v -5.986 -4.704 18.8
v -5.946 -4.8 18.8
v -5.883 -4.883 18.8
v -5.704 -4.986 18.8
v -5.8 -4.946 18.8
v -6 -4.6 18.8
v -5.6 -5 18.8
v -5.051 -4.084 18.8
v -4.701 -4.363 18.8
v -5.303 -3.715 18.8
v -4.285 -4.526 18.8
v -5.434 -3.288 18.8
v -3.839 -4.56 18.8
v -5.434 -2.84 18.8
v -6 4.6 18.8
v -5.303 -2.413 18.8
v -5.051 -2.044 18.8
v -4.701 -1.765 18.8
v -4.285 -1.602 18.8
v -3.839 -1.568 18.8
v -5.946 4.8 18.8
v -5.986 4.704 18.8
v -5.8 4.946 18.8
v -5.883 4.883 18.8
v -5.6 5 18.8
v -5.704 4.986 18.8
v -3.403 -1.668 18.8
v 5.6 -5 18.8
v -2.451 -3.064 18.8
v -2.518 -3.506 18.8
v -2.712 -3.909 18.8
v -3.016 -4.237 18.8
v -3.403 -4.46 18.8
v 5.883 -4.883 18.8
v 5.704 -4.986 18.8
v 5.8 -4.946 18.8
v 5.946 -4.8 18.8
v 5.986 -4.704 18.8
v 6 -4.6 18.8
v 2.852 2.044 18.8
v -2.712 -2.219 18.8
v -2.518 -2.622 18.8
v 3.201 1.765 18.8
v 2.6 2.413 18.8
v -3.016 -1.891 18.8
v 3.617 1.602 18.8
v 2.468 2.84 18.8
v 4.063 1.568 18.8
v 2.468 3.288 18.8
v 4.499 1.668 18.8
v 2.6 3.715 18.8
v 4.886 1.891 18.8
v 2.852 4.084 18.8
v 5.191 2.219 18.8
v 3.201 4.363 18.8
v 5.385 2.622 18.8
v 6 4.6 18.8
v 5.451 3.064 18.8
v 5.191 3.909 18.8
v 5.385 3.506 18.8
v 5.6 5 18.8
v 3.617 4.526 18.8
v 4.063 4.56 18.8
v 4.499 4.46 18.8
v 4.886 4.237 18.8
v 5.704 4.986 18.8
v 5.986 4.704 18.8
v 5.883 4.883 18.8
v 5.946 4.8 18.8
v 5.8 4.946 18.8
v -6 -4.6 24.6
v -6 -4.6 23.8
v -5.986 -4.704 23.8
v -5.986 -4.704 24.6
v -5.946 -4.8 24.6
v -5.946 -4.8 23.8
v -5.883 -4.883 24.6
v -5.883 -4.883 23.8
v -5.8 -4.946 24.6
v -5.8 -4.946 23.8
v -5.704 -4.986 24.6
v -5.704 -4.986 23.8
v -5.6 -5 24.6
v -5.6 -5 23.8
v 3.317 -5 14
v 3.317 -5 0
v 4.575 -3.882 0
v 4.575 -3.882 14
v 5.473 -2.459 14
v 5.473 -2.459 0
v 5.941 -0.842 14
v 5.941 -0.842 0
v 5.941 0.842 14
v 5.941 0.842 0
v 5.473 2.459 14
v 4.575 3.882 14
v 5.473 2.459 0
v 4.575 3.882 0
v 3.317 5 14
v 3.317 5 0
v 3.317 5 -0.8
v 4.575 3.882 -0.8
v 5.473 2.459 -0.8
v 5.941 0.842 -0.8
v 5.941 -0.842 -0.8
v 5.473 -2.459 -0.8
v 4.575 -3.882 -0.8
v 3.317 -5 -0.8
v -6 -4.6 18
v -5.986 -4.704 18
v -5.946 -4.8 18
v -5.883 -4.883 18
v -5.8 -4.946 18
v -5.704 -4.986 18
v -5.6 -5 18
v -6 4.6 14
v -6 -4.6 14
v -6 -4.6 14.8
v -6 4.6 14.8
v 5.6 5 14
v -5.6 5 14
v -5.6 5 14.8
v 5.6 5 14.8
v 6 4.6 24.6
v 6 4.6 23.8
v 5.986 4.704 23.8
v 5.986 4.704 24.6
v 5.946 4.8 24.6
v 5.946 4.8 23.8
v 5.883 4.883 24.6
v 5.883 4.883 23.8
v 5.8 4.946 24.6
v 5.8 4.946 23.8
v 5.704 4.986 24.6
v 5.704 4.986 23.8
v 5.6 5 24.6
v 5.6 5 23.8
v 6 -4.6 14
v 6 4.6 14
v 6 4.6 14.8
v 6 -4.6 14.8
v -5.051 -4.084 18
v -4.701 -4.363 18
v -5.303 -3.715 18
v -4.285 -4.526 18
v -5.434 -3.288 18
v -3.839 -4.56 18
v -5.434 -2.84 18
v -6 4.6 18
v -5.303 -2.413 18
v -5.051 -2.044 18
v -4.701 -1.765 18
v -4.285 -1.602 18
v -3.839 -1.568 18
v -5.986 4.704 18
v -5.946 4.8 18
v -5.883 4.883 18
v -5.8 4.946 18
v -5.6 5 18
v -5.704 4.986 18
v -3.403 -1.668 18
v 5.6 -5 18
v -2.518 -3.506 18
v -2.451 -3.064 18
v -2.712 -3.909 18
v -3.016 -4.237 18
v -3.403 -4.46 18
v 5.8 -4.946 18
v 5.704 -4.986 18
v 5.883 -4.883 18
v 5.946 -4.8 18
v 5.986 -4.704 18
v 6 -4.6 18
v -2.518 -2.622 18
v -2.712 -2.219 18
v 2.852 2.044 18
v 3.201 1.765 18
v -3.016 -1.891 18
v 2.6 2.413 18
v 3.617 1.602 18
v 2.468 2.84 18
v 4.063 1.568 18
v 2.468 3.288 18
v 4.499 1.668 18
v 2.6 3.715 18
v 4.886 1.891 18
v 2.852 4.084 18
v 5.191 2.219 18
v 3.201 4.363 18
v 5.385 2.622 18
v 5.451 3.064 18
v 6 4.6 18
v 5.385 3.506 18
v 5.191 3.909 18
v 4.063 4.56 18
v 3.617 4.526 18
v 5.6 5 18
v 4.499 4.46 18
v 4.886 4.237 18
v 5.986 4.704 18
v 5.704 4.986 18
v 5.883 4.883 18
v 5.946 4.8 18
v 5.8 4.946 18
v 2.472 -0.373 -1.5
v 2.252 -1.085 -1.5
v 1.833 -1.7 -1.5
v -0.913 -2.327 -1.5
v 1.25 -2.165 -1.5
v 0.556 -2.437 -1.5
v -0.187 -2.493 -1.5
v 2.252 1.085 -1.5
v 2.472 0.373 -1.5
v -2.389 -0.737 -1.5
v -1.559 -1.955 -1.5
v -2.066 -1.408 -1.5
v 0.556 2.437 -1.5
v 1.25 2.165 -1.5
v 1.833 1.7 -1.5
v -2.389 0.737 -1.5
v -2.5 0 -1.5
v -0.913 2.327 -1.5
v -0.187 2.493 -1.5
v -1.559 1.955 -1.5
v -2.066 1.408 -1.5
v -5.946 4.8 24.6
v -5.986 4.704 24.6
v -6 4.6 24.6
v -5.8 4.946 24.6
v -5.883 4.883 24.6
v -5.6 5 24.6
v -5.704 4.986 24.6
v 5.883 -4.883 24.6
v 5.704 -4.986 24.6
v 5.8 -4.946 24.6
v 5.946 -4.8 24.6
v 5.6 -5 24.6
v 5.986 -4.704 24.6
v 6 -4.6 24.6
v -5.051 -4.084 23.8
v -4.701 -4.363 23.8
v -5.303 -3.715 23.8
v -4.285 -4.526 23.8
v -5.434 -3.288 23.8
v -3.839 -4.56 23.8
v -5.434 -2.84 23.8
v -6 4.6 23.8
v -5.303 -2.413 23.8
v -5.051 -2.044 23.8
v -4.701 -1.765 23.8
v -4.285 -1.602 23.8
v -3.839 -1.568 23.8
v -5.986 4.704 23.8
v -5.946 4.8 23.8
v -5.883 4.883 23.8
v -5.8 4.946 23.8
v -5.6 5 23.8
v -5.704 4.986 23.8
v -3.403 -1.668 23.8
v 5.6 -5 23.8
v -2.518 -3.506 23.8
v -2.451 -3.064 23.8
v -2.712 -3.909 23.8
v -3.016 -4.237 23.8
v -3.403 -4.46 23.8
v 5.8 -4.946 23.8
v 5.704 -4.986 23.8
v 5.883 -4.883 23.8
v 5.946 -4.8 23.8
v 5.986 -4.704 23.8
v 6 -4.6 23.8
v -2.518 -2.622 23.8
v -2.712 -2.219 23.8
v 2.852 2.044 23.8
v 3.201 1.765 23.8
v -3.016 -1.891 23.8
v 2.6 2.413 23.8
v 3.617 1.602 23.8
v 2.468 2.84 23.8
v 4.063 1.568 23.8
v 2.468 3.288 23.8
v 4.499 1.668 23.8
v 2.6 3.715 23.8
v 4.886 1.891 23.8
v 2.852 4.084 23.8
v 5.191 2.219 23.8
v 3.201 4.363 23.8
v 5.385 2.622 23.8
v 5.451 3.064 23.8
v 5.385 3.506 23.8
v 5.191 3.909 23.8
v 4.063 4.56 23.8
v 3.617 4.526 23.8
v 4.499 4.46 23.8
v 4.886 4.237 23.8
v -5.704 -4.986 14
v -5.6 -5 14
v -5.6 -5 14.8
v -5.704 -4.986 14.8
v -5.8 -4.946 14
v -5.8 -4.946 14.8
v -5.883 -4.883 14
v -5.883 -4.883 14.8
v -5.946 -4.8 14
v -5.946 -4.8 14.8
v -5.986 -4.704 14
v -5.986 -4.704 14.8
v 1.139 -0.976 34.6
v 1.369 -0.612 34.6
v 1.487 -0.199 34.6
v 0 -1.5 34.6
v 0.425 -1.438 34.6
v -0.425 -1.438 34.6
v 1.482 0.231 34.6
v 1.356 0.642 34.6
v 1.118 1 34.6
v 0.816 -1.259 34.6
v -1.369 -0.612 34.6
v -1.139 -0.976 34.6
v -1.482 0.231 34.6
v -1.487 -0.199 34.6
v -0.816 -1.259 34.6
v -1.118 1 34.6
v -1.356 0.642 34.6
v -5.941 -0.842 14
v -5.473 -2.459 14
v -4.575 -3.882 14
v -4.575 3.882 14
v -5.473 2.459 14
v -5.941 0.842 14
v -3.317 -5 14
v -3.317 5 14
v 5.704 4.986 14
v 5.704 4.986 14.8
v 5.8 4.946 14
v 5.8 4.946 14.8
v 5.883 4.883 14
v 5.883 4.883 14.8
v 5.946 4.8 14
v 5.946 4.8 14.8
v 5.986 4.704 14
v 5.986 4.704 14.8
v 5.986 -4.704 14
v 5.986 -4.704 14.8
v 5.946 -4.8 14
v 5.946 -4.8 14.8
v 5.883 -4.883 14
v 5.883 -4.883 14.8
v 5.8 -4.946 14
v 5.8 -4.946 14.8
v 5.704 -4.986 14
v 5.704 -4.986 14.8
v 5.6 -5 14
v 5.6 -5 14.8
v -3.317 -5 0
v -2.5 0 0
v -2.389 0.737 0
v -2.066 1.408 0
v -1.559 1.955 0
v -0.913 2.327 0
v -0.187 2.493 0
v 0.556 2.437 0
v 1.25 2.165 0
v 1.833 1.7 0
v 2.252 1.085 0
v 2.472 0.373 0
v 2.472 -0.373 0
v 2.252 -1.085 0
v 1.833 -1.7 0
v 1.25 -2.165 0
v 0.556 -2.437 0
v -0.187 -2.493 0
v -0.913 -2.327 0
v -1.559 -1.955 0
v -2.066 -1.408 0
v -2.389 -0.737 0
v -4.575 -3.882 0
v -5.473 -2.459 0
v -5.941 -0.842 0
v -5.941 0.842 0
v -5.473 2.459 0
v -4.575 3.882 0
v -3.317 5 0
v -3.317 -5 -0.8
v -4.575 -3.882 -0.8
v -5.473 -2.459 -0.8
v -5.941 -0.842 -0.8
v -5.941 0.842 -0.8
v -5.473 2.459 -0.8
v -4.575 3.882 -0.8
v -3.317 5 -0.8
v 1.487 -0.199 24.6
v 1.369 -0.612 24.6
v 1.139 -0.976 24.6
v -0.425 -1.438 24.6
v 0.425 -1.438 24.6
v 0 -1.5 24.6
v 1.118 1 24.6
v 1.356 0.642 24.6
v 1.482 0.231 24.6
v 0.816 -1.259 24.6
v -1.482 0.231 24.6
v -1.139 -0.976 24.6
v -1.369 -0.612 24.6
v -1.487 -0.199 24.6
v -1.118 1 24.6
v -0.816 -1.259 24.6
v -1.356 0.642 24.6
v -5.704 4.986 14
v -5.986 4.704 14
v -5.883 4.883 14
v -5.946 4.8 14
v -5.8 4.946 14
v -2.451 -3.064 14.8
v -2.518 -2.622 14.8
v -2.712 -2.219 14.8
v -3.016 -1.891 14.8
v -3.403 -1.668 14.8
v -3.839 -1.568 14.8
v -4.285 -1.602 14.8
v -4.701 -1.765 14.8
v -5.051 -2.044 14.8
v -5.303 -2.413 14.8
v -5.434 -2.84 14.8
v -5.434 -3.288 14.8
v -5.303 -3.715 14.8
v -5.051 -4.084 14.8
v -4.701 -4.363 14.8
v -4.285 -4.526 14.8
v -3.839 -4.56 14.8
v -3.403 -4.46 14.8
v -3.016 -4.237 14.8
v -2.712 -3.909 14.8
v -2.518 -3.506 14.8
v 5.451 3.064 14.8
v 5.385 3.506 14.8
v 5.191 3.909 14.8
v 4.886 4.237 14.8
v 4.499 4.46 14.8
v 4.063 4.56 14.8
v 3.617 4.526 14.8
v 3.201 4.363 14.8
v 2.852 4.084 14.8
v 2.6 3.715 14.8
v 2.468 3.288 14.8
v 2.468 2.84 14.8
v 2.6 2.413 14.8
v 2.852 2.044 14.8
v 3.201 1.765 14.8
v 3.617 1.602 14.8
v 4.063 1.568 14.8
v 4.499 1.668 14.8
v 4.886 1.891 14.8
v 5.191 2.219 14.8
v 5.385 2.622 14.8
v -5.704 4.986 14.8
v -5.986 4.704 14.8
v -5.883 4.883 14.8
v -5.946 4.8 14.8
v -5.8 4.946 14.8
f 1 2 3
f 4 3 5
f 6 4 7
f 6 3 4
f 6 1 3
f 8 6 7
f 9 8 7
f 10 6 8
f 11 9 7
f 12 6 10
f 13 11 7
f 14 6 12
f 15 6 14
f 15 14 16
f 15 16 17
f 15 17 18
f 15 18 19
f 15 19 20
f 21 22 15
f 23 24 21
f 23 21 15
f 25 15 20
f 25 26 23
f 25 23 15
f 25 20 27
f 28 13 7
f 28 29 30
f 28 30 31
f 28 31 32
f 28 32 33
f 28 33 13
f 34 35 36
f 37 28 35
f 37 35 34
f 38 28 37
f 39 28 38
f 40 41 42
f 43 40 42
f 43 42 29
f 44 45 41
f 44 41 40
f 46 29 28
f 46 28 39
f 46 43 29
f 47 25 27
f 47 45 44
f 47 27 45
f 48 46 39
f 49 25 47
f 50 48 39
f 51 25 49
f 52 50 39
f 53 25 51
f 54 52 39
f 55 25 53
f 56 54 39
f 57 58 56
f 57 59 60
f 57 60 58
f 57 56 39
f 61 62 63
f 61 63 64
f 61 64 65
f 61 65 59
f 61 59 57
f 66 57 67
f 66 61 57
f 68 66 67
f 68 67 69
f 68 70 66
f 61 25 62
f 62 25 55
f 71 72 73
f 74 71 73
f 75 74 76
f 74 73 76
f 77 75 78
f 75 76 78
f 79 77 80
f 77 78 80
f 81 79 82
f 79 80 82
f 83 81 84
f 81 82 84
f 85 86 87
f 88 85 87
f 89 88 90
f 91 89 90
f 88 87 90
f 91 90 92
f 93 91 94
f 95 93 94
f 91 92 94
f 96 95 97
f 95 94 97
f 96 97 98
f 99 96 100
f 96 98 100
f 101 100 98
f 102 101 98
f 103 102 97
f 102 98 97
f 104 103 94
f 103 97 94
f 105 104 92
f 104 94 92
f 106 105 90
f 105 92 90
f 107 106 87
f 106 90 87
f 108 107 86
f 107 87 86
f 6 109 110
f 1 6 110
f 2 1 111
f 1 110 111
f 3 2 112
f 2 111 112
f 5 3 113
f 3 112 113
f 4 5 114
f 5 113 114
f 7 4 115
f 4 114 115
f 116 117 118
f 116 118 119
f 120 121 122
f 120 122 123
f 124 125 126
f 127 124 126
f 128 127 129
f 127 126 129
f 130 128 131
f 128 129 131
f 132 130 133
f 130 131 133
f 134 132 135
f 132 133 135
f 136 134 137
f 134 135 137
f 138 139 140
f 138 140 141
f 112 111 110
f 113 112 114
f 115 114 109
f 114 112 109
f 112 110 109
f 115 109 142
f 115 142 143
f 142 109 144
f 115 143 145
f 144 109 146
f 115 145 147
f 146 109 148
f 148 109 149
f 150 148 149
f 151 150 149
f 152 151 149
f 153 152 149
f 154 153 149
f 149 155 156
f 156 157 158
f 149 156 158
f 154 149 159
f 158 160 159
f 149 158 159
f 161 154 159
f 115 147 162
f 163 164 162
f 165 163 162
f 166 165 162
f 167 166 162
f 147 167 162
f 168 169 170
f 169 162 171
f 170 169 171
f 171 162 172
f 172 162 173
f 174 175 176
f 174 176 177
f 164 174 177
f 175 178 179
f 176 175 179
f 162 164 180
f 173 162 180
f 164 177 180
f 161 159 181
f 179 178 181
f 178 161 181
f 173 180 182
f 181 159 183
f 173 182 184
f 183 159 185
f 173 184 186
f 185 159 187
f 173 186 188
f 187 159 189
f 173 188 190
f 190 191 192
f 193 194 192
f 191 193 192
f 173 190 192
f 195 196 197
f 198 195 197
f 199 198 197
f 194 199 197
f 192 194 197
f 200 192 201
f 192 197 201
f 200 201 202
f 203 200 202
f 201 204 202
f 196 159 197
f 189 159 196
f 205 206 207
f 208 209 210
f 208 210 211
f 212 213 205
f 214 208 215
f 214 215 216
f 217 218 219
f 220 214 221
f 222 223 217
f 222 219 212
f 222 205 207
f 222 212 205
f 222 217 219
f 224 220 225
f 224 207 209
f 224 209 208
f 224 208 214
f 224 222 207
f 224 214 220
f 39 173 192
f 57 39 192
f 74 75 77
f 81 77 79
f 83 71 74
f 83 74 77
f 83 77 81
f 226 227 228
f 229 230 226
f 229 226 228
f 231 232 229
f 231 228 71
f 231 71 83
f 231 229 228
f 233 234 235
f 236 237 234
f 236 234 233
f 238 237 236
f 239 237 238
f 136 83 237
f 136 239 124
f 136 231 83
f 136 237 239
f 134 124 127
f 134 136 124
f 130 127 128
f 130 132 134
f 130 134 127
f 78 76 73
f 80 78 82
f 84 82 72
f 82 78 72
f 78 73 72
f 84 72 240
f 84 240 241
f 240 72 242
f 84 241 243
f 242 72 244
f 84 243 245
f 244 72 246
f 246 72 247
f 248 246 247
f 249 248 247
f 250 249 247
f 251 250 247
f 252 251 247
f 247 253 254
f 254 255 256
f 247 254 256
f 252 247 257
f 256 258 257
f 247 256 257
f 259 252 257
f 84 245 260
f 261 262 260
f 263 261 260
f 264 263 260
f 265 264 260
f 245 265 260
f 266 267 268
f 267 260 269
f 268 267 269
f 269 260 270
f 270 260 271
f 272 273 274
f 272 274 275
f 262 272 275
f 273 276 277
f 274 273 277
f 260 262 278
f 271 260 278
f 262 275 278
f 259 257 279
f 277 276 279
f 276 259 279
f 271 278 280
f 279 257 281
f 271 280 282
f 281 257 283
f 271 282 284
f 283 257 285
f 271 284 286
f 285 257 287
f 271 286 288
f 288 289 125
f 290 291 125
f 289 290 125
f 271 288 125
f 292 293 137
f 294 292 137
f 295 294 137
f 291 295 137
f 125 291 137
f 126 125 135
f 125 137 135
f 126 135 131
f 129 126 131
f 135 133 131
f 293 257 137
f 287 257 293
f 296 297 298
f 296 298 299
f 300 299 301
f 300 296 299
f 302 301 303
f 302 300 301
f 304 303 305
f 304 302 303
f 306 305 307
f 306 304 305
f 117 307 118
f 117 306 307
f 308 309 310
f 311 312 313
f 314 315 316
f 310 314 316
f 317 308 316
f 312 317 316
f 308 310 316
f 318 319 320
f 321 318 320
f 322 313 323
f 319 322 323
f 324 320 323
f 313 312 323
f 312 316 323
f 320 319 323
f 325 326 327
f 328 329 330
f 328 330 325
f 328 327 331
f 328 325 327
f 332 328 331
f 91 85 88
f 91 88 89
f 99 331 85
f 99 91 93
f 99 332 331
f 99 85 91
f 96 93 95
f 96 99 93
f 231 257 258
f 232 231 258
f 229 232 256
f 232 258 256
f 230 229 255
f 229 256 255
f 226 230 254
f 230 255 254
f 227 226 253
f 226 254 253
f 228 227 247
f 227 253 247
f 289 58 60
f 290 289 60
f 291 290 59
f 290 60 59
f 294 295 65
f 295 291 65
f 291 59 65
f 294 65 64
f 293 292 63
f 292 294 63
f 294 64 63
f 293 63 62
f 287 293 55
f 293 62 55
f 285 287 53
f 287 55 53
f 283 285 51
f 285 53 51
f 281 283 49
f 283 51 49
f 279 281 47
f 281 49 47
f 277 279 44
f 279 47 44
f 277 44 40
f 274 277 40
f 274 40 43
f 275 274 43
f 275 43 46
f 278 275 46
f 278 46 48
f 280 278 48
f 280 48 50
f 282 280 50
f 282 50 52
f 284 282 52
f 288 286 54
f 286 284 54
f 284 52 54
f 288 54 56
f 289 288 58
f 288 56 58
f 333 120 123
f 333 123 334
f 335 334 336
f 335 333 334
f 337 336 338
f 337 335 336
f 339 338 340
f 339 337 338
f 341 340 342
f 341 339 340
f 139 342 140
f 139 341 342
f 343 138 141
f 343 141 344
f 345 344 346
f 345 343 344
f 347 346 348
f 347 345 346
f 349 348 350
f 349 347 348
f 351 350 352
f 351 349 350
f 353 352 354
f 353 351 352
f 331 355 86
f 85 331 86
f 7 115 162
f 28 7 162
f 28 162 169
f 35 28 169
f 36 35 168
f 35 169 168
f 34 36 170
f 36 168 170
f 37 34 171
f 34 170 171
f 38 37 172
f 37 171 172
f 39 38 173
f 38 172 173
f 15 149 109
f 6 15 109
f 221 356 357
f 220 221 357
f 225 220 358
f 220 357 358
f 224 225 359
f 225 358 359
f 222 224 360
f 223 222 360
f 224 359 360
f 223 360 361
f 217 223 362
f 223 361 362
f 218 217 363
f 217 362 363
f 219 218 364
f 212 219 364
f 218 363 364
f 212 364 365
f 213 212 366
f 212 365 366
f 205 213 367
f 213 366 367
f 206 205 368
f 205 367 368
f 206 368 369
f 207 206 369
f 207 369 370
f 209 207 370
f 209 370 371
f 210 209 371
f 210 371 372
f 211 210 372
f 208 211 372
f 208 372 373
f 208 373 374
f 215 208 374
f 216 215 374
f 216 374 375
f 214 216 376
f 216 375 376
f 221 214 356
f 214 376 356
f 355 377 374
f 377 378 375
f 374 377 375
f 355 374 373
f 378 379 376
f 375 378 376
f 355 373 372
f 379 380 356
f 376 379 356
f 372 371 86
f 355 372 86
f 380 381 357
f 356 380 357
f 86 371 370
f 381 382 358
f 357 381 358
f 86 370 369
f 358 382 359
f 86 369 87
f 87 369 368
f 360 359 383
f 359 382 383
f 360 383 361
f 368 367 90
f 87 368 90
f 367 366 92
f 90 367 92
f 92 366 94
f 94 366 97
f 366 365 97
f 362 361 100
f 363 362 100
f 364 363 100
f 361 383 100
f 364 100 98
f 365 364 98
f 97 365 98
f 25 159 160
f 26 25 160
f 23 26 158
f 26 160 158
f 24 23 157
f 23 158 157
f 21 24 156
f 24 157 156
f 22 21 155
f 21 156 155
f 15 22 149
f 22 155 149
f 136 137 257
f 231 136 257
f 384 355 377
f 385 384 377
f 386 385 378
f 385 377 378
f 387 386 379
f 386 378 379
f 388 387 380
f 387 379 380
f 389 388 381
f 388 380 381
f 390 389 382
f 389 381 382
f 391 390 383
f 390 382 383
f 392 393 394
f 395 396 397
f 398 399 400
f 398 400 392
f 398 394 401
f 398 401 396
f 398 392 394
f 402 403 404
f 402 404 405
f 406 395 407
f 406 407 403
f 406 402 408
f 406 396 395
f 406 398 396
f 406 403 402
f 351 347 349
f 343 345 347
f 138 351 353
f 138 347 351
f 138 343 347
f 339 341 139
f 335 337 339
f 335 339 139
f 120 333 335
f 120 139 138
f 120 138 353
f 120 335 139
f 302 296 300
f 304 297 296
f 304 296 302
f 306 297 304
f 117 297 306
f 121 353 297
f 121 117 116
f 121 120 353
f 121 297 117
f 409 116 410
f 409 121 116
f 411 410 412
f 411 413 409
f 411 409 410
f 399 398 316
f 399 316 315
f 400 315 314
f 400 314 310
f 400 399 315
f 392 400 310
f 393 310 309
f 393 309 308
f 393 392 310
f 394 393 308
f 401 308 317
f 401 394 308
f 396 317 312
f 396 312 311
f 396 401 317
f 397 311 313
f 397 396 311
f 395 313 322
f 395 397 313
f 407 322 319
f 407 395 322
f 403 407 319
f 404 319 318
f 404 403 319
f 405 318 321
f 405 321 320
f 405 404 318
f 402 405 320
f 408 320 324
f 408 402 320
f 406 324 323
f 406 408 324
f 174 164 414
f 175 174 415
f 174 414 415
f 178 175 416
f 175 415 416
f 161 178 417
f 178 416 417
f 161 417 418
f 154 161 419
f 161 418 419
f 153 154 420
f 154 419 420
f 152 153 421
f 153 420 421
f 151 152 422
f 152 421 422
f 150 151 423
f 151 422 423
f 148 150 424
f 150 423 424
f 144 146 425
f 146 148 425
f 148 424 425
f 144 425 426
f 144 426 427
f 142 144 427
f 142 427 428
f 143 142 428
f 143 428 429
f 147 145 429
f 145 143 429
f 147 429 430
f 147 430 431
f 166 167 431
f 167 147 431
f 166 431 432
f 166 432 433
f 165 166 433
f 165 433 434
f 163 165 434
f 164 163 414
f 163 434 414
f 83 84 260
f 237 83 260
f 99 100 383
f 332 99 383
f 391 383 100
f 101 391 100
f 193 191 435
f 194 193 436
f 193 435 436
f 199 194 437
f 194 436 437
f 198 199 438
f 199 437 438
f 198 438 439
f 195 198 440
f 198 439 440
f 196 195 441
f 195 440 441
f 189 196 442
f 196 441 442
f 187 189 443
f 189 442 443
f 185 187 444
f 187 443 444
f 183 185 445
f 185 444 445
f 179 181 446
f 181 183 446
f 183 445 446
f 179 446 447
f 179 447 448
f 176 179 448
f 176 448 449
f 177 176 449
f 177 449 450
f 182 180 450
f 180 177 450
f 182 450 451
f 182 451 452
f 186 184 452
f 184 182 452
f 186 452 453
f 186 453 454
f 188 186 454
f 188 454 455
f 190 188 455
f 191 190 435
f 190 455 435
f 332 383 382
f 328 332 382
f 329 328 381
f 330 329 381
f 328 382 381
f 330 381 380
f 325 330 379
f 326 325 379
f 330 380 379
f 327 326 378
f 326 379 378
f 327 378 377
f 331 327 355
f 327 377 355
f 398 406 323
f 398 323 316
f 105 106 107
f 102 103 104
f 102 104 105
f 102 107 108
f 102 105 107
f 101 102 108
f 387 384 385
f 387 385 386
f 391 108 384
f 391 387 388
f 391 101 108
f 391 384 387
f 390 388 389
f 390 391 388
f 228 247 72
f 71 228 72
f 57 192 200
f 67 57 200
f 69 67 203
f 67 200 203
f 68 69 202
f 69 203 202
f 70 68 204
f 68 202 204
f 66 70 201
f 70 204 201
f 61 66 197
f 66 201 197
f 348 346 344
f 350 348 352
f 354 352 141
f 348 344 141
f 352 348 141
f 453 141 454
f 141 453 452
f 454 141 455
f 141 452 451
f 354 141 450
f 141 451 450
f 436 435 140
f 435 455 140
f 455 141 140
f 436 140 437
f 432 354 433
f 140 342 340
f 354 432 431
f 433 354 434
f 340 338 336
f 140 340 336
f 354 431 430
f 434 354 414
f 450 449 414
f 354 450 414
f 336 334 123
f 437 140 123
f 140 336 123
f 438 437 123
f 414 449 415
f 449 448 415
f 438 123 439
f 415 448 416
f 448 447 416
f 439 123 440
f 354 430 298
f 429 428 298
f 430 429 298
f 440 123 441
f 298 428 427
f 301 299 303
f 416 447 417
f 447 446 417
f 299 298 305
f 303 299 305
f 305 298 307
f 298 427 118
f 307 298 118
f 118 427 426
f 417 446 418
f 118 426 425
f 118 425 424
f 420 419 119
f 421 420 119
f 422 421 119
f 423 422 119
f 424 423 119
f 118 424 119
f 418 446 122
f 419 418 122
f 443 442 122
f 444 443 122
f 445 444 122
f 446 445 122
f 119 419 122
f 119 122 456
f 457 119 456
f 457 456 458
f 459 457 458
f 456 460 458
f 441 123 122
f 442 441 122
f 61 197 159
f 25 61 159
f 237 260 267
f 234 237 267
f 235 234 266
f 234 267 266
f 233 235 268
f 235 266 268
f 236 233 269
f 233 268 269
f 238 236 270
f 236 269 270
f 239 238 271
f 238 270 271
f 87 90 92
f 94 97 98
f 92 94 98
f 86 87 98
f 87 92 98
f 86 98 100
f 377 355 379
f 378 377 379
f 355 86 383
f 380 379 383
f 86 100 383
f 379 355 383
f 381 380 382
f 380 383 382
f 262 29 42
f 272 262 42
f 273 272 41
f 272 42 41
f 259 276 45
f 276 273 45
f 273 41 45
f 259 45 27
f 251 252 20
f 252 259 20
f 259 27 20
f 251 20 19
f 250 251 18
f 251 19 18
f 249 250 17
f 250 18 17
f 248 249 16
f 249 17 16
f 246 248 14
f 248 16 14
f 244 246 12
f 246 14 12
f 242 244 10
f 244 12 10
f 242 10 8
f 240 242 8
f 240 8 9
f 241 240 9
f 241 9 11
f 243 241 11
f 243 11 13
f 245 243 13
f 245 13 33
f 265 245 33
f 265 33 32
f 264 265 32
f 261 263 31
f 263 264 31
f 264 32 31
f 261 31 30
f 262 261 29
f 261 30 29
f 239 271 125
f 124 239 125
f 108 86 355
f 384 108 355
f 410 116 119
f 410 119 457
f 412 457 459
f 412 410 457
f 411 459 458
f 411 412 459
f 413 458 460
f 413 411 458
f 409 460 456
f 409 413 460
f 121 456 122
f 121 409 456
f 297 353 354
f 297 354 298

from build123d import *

# Parameters (mm, degrees)
EXTRUDE_1_DEPTH = 14
EXTRUDE_8_DEPTH = 0.8
SKETCH_2_R      = 2.5
EXTRUDE_2_DEPTH = 1.5
EXTRUDE_3_DEPTH = 0.8
EXTRUDE_START   = 3.2
EXTRUDE_4_DEPTH = 0.8
EXTRUDE_START_2 = 5
EXTRUDE_5_DEPTH = 0.8
SKETCH_6_R      = 1.5
EXTRUDE_6_DEPTH = 9.8
EXTRUDE_7_DEPTH = 10


with BuildPart() as part:
    # 草圖1 → 填料-伸長1 (new body)
    with BuildSketch(Plane.XY):
        with BuildLine():
            Line((-3.31662479, -5), (3.31662479, -5))
            ThreePointArc((3.31662479, -5), (6, 0), (3.31662479, 5))
            Line((3.31662479, 5), (-3.31662479, 5))
            ThreePointArc((-3.31662479, 5), (-6, 0), (-3.31662479, -5))
        make_face()
    extrude(amount=EXTRUDE_1_DEPTH)

    # 草圖2 → 填料-伸長2 (add)
    with BuildSketch(Plane(origin=(0, 0, 0), x_dir=(-1, 0, 0), z_dir=(0, 0, -1))):
        Circle(SKETCH_2_R)
    extrude(amount=EXTRUDE_2_DEPTH)


with BuildPart() as body_2:
    # 草圖8 → 填料-伸長8 (new body)
    with BuildSketch(Plane(origin=(0, 0, 0), x_dir=(-1, 0, 0), z_dir=(0, 0, -1))):
        with BuildLine():
            Line((-3.31662479, -5), (3.31662479, -5))
            ThreePointArc((3.31662479, -5), (6, 0), (3.31662479, 5))
            Line((3.31662479, 5), (-3.31662479, 5))
            ThreePointArc((-3.31662479, 5), (-6, 0), (-3.31662479, -5))
        make_face()
    extrude(amount=EXTRUDE_8_DEPTH)


with BuildPart() as body_3:
    # 草圖3 → 填料-伸長3 (new body)
    with BuildSketch(Plane.XY.offset(14)):
        with BuildLine():
            Line((-5.6, 5), (5.6, 5))
            ThreePointArc((5.6, 5), (5.882842712, 4.882842712), (6, 4.6))
            Line((6, 4.6), (6, -4.6))
            ThreePointArc((6, -4.6), (5.882842712, -4.882842712), (5.6, -5))
            Line((5.6, -5), (-5.6, -5))
            ThreePointArc((-5.6, -5), (-5.882842712, -4.882842712), (-6, -4.6))
            Line((-6, -4.6), (-6, 4.6))
            ThreePointArc((-6, 4.6), (-5.882842712, 4.882842712), (-5.6, 5))
        make_face()
    extrude(amount=EXTRUDE_3_DEPTH)



with BuildPart() as body_4:
    # 草圖4 → 填料-伸長4 (new body)
    with BuildSketch(Plane.XY.offset(14.8).offset(EXTRUDE_START)):
        with BuildLine():
            Line((-5.6, -5), (5.6, -5))
            ThreePointArc((5.6, -5), (5.882842712, -4.882842712), (6, -4.6))
            Line((6, -4.6), (6, 4.6))
            ThreePointArc((6, 4.6), (5.882842712, 4.882842712), (5.6, 5))
            Line((5.6, 5), (-5.6, 5))
            ThreePointArc((-5.6, 5), (-5.882842712, 4.882842712), (-6, 4.6))
            Line((-6, 4.6), (-6, -4.6))
            ThreePointArc((-6, -4.6), (-5.882842712, -4.882842712), (-5.6, -5))
        make_face()
    extrude(amount=EXTRUDE_4_DEPTH)


with BuildPart() as body_5:
    # 草圖5 → 填料-伸長5 (new body)
    with BuildSketch(Plane.XY.offset(18.8).offset(EXTRUDE_START_2)):
        with BuildLine():
            Line((-5.6, -5), (5.6, -5))
            ThreePointArc((5.6, -5), (5.882842712, -4.882842712), (6, -4.6))
            Line((6, -4.6), (6, 4.6))
            ThreePointArc((6, 4.6), (5.882842712, 4.882842712), (5.6, 5))
            Line((5.6, 5), (-5.6, 5))
            ThreePointArc((-5.6, 5), (-5.882842712, 4.882842712), (-6, 4.6))
            Line((-6, 4.6), (-6, -4.6))
            ThreePointArc((-6, -4.6), (-5.882842712, -4.882842712), (-5.6, -5))
        make_face()
    extrude(amount=EXTRUDE_5_DEPTH)


with BuildPart() as body_3_1:
    add(body_3.part)

    add(body_4.part)  # 填料-伸長6 merges body 4

    add(body_5.part)  # 填料-伸長6 merges body 5
    # 草圖6 → 填料-伸長6 (add)
    with BuildSketch(Plane.XY.offset(14.8)):
        with Locations((3.951189395, 3.064001038)):
            Circle(SKETCH_6_R)
        with Locations((-3.951189395, -3.064001038)):
            Circle(SKETCH_6_R)
    extrude(amount=EXTRUDE_6_DEPTH)


with BuildPart() as body_4_2:
    # 草圖7 → 填料-伸長7 (new body)
    with BuildSketch(Plane.XY.offset(24.6)):
        with BuildLine():
            Line((-1.118033989, 1), (1.118033989, 1))
            ThreePointArc((1.118033989, 1), (0, -1.5), (-1.118033989, 1))
        make_face()
    extrude(amount=EXTRUDE_7_DEPTH)


solid = Compound([part.part, body_2.part, body_3_1.part, body_4_2.part])
